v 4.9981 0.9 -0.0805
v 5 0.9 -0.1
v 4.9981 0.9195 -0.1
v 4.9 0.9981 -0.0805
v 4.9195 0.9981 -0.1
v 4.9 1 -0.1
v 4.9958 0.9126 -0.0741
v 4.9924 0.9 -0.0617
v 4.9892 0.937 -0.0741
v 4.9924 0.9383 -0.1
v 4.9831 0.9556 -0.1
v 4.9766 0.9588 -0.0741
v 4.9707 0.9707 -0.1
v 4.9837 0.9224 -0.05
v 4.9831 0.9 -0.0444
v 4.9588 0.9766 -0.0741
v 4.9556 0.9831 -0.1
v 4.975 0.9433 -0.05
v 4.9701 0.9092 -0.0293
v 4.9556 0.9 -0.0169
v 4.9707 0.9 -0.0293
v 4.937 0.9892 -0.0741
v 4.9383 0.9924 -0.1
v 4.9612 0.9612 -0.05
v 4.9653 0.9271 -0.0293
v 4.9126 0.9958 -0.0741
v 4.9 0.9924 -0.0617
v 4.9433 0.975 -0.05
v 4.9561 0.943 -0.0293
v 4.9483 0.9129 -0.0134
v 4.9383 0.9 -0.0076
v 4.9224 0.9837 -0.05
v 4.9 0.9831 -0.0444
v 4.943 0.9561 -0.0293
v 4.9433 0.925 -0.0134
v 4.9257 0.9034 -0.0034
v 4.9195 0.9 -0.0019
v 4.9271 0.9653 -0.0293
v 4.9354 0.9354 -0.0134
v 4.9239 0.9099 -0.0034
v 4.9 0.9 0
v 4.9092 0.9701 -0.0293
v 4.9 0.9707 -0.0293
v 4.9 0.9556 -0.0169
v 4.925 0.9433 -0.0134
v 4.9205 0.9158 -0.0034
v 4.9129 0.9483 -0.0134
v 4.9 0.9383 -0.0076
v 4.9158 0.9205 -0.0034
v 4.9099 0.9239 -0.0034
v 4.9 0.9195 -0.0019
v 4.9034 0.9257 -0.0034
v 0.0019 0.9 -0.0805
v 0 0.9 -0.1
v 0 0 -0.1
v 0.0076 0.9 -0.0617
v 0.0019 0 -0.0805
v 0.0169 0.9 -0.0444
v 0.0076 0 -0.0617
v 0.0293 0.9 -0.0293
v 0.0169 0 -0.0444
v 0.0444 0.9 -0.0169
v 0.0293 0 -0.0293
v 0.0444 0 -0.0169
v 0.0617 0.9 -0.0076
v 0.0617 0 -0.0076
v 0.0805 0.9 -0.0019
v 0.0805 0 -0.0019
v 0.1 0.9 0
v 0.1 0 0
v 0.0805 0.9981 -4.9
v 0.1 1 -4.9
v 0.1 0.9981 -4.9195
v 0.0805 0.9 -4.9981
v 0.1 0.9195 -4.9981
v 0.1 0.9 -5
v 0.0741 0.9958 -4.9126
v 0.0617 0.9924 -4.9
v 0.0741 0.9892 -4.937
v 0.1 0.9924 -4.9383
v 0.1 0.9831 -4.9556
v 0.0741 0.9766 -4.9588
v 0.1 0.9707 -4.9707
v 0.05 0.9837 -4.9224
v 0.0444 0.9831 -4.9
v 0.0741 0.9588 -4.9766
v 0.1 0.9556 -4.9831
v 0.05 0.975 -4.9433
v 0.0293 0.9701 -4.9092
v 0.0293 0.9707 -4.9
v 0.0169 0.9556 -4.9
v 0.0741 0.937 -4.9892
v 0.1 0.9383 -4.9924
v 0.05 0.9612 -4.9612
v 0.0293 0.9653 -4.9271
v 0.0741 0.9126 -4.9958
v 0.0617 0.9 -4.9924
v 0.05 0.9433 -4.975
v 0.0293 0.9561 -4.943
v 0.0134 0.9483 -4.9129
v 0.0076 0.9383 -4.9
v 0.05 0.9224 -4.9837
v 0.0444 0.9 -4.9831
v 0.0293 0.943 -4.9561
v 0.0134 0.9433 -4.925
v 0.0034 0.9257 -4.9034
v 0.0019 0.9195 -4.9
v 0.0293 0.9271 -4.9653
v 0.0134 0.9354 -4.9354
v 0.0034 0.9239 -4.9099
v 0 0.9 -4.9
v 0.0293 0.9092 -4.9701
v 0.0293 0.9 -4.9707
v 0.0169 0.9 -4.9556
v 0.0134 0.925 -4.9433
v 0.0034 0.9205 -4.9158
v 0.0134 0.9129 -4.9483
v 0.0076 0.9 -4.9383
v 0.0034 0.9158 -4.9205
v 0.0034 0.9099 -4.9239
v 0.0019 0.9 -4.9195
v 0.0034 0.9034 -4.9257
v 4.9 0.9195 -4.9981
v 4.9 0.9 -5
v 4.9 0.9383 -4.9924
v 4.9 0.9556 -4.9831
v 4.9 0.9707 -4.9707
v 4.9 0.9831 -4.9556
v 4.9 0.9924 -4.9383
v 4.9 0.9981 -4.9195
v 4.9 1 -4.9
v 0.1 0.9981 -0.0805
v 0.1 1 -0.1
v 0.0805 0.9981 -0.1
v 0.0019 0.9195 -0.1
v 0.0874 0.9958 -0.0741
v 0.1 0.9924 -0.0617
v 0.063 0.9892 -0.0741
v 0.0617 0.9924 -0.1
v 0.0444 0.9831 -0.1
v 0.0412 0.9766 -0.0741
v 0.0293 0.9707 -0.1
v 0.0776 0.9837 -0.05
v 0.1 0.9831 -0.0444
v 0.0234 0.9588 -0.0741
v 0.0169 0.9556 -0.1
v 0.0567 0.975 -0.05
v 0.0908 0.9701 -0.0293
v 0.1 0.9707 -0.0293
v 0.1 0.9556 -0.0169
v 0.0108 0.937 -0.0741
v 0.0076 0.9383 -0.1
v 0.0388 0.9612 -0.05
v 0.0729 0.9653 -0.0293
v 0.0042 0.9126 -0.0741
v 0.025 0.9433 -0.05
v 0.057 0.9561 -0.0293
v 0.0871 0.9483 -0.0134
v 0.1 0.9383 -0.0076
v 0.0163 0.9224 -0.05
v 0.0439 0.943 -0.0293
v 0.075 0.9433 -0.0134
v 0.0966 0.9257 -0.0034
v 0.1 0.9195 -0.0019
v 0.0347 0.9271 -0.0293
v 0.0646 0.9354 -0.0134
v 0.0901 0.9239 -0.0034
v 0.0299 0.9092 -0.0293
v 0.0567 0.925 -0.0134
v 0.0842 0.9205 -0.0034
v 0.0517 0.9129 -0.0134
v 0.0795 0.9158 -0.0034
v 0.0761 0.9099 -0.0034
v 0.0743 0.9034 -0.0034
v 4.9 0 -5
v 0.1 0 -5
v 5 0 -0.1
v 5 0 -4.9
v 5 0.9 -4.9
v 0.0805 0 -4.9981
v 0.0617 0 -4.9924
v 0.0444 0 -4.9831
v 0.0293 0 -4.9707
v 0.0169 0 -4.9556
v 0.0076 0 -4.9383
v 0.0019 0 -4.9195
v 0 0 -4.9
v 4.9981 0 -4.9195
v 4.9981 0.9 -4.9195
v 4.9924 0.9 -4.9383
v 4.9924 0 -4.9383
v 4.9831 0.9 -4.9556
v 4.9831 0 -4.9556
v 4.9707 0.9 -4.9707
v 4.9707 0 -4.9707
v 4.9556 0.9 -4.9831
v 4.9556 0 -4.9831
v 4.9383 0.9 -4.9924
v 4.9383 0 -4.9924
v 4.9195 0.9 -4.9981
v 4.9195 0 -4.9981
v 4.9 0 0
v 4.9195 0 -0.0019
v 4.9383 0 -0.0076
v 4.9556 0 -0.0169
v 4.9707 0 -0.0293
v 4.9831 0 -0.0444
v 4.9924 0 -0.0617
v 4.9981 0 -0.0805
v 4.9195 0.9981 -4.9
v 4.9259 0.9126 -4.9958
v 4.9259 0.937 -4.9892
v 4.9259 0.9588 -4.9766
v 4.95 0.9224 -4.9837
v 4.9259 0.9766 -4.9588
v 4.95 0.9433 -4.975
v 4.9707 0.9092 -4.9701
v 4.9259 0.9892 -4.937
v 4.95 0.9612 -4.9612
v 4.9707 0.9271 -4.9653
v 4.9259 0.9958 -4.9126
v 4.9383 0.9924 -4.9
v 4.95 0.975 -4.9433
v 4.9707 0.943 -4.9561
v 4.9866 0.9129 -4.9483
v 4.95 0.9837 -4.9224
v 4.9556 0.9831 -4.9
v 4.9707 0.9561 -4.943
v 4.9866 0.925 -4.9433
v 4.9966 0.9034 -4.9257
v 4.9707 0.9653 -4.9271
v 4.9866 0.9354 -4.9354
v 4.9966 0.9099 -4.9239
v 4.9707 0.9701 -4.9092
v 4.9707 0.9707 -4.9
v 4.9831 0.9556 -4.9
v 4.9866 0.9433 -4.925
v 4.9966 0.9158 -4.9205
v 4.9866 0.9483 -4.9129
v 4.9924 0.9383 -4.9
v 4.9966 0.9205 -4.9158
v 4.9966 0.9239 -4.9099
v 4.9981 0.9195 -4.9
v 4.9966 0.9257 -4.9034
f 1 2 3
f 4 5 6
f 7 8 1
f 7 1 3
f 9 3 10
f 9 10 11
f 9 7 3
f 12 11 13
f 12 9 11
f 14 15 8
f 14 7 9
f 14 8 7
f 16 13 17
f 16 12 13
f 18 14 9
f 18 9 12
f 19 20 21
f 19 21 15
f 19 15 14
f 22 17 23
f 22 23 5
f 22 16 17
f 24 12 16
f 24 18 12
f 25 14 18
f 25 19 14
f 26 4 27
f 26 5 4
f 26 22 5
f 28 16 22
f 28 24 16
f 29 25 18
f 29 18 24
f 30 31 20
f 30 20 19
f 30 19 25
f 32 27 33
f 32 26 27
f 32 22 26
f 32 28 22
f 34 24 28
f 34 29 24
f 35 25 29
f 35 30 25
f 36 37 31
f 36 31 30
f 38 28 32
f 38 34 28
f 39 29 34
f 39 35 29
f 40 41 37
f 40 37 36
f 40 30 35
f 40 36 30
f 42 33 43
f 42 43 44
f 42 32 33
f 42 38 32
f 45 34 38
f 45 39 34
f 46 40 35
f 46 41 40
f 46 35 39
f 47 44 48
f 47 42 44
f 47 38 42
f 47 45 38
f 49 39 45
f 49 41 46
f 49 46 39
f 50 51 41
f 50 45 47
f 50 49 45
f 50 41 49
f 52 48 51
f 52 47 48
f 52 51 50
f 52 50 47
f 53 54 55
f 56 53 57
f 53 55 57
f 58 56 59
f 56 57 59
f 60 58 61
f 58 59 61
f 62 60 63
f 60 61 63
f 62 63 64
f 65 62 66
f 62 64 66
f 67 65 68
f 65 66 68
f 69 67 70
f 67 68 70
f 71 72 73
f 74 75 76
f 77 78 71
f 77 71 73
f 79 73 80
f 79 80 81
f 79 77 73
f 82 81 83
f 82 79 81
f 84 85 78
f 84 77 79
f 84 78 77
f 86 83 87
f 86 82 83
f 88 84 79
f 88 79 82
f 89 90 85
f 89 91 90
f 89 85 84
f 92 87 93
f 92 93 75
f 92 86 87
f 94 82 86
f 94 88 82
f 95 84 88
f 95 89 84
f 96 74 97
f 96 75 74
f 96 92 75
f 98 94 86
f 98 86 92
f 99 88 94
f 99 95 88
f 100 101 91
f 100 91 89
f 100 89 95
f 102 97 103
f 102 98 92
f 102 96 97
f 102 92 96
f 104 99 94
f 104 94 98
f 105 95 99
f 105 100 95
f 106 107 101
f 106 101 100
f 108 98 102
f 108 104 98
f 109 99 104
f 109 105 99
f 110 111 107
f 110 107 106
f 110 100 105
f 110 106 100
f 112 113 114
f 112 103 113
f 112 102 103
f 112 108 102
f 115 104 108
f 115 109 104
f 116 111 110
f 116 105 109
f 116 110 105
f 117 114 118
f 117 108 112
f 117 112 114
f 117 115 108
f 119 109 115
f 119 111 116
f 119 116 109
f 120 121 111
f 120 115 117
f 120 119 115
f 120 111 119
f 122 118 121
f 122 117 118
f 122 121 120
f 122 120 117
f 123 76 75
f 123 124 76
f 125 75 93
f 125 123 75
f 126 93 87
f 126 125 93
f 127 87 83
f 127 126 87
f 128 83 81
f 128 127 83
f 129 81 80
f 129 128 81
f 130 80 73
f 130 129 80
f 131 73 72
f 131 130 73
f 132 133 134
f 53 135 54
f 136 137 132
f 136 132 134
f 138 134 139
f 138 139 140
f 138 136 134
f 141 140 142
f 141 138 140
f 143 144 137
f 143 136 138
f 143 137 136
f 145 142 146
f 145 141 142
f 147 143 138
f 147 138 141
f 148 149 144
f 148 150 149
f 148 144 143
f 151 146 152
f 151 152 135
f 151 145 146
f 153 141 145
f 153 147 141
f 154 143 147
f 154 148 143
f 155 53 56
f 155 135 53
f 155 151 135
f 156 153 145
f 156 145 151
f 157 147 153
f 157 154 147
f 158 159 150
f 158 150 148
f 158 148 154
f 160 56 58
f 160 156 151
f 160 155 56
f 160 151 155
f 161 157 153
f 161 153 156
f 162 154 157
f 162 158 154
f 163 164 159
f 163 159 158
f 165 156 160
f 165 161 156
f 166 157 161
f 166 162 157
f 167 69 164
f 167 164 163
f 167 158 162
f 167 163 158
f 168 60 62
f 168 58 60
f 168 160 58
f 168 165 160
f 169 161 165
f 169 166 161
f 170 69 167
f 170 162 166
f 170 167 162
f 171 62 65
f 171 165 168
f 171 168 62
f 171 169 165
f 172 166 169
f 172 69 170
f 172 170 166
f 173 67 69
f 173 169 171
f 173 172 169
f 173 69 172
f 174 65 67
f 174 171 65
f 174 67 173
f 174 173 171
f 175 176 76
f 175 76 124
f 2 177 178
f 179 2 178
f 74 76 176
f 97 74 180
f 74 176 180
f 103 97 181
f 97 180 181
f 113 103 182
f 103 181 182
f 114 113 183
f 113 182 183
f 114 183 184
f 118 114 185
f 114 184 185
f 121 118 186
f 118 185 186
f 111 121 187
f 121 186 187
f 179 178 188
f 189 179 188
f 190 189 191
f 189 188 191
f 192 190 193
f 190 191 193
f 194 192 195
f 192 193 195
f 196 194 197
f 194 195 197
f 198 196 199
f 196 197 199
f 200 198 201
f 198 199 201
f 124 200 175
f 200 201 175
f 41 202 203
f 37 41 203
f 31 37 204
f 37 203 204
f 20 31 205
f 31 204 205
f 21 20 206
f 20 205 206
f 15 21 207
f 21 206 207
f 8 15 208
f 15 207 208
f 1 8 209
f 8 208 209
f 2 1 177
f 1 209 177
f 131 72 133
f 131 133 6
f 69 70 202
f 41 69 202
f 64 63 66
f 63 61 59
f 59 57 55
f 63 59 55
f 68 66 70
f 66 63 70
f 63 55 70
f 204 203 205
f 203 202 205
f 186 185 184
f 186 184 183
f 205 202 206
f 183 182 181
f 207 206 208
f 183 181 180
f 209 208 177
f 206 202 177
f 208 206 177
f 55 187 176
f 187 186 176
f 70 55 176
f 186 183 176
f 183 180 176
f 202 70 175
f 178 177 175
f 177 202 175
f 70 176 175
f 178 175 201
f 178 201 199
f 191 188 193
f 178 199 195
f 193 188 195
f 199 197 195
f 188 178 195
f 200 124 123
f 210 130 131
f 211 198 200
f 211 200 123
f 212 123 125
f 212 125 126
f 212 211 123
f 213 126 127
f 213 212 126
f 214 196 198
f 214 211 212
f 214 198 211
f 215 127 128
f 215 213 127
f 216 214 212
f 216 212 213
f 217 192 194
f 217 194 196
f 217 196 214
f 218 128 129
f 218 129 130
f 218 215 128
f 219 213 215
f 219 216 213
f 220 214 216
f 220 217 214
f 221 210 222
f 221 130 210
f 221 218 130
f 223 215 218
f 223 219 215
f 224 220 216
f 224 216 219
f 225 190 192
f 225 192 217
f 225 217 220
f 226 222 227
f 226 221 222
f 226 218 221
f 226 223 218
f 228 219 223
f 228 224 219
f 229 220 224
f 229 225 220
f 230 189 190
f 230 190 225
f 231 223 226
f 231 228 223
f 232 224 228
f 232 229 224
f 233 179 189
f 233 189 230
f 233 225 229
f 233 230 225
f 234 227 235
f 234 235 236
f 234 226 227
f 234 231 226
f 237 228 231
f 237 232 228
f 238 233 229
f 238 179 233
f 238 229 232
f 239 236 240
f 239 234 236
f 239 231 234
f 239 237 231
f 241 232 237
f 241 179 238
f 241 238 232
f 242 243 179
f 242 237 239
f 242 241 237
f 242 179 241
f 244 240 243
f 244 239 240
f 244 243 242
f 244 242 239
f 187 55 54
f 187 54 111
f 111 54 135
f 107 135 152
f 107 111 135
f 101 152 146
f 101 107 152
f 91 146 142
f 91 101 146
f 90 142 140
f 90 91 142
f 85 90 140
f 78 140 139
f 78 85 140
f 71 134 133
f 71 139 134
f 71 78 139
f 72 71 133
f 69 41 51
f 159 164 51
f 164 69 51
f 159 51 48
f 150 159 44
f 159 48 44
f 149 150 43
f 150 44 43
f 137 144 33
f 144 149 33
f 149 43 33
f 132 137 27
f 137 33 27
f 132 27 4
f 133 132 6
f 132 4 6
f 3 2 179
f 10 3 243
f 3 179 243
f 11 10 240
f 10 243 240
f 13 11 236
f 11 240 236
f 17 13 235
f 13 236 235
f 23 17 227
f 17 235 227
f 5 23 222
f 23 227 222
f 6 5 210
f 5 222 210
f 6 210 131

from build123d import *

# Parameters (mm, degrees)
SKETCH1_W           = 5
SKETCH1_H           = 5
BOSS_EXTRUDE1_DEPTH = 1
FILLET1_R           = 0.1
FILLET2_R           = 0.1


with BuildPart() as part:
    # Sketch1 → Boss-Extrude1 (new body)
    with BuildSketch(Plane(origin=(0, 0, 0), x_dir=(1, 0, 0), z_dir=(0, 1, 0))):
        with Locations((2.5, 2.5)):
            Rectangle(SKETCH1_W, SKETCH1_H)
    extrude(amount=BOSS_EXTRUDE1_DEPTH)

    # Fillet1
    fillet1_edges = [part.edges().sort_by_distance(p)[0] for p in [
        (5, 1, -2.5),
        (2.5, 1, -5),
        (0, 1, -2.5),
        (2.5, 1, 0),
    ]]
    fillet(fillet1_edges, radius=FILLET1_R)

    # Fillet2
    # the kernel refuses this fillet: 0.1 mm, written as the material it takes off along each edge
    with BuildSketch(Plane(origin=(4.9, 0.9, -4.9), x_dir=(0, 0, -1), z_dir=(1, 0, 0))) as fillet2_piece_1_section:
        Polygon((0, 0), (FILLET2_R, 0), (FILLET2_R, FILLET2_R), (0, FILLET2_R), align=None)
    fillet2_piece_1 = extrude(amount=FILLET2_R, mode=Mode.PRIVATE)
    fillet2_piece_1 = fillet2_piece_1 - Plane(origin=(4.9, 0.9, -4.9), x_dir=(0, -0.7071067811865475, 0.7071067811865475), z_dir=(1, 0, 0)) * Sphere(FILLET2_R, mode=Mode.PRIVATE)
    add(fillet2_piece_1, mode=Mode.SUBTRACT)
    with BuildSketch(Plane(origin=(4.9, 0.9, -0.1), x_dir=(1, 0, 0), z_dir=(0, 0, 1))) as fillet2_piece_2_section:
        Polygon((0, 0), (FILLET2_R, 0), (FILLET2_R, FILLET2_R), (0, FILLET2_R), align=None)
    fillet2_piece_2 = extrude(amount=FILLET2_R, mode=Mode.PRIVATE)
    fillet2_piece_2 = fillet2_piece_2 - Plane(origin=(4.9, 0.9, -0.1), x_dir=(-0.7071067811865475, -0.7071067811865475, 0), z_dir=(0, 0, 1)) * Sphere(FILLET2_R, mode=Mode.PRIVATE)
    add(fillet2_piece_2, mode=Mode.SUBTRACT)
    with BuildSketch(Plane(origin=(0.1, 0.9, -4.9), x_dir=(0, 0, -1), z_dir=(-1, 0, 0))) as fillet2_piece_3_section:
        Polygon((0, 0), (FILLET2_R, 0), (FILLET2_R, -FILLET2_R), (0, -FILLET2_R), align=None)
    fillet2_piece_3 = extrude(amount=FILLET2_R, mode=Mode.PRIVATE)
    fillet2_piece_3 = fillet2_piece_3 - Plane(origin=(0.1, 0.9, -4.9), x_dir=(0, -0.7071067811865475, 0.7071067811865475), z_dir=(-1, 0, 0)) * Sphere(FILLET2_R, mode=Mode.PRIVATE)
    add(fillet2_piece_3, mode=Mode.SUBTRACT)
    with BuildSketch(Plane(origin=(0.1, 0.9, -0.1), x_dir=(-1, 0, 0), z_dir=(0, 0, 1))) as fillet2_piece_4_section:
        Polygon((0, 0), (FILLET2_R, 0), (FILLET2_R, -FILLET2_R), (0, -FILLET2_R), align=None)
    fillet2_piece_4 = extrude(amount=FILLET2_R, mode=Mode.PRIVATE)
    fillet2_piece_4 = fillet2_piece_4 - Plane(origin=(0.1, 0.9, -0.1), x_dir=(0.7071067811865475, -0.7071067811865475, 0), z_dir=(0, 0, 1)) * Sphere(FILLET2_R, mode=Mode.PRIVATE)
    add(fillet2_piece_4, mode=Mode.SUBTRACT)
    with BuildSketch(Plane(origin=(0, -0.25, 0), x_dir=(1, 0, 0), z_dir=(0, 1, 0)), Plane(origin=(0, -0.25, -5), x_dir=(0, 0, 1), z_dir=(0, 1, 0))) as fillet2_piece_5:
        with BuildLine():
            CenterArc((FILLET2_R, FILLET2_R), FILLET2_R, 180, 90)
            Line((0, FILLET2_R), (0, 0))
            Line((0, 0), (FILLET2_R, 0))
        make_face()
    extrude(amount=1.15, mode=Mode.SUBTRACT)
    with BuildSketch(Plane(origin=(5, -0.25, 0), x_dir=(-1, 0, 0), z_dir=(0, 1, 0)), Plane(origin=(5, -0.25, -5), x_dir=(0, 0, 1), z_dir=(0, 1, 0))) as fillet2_piece_6:
        with BuildLine():
            CenterArc((FILLET2_R, -FILLET2_R), FILLET2_R, 90, 90)
            Line((0, -FILLET2_R), (0, 0))
            Line((0, 0), (FILLET2_R, 0))
        make_face()
    extrude(amount=1.15, mode=Mode.SUBTRACT)


solid = part.part
